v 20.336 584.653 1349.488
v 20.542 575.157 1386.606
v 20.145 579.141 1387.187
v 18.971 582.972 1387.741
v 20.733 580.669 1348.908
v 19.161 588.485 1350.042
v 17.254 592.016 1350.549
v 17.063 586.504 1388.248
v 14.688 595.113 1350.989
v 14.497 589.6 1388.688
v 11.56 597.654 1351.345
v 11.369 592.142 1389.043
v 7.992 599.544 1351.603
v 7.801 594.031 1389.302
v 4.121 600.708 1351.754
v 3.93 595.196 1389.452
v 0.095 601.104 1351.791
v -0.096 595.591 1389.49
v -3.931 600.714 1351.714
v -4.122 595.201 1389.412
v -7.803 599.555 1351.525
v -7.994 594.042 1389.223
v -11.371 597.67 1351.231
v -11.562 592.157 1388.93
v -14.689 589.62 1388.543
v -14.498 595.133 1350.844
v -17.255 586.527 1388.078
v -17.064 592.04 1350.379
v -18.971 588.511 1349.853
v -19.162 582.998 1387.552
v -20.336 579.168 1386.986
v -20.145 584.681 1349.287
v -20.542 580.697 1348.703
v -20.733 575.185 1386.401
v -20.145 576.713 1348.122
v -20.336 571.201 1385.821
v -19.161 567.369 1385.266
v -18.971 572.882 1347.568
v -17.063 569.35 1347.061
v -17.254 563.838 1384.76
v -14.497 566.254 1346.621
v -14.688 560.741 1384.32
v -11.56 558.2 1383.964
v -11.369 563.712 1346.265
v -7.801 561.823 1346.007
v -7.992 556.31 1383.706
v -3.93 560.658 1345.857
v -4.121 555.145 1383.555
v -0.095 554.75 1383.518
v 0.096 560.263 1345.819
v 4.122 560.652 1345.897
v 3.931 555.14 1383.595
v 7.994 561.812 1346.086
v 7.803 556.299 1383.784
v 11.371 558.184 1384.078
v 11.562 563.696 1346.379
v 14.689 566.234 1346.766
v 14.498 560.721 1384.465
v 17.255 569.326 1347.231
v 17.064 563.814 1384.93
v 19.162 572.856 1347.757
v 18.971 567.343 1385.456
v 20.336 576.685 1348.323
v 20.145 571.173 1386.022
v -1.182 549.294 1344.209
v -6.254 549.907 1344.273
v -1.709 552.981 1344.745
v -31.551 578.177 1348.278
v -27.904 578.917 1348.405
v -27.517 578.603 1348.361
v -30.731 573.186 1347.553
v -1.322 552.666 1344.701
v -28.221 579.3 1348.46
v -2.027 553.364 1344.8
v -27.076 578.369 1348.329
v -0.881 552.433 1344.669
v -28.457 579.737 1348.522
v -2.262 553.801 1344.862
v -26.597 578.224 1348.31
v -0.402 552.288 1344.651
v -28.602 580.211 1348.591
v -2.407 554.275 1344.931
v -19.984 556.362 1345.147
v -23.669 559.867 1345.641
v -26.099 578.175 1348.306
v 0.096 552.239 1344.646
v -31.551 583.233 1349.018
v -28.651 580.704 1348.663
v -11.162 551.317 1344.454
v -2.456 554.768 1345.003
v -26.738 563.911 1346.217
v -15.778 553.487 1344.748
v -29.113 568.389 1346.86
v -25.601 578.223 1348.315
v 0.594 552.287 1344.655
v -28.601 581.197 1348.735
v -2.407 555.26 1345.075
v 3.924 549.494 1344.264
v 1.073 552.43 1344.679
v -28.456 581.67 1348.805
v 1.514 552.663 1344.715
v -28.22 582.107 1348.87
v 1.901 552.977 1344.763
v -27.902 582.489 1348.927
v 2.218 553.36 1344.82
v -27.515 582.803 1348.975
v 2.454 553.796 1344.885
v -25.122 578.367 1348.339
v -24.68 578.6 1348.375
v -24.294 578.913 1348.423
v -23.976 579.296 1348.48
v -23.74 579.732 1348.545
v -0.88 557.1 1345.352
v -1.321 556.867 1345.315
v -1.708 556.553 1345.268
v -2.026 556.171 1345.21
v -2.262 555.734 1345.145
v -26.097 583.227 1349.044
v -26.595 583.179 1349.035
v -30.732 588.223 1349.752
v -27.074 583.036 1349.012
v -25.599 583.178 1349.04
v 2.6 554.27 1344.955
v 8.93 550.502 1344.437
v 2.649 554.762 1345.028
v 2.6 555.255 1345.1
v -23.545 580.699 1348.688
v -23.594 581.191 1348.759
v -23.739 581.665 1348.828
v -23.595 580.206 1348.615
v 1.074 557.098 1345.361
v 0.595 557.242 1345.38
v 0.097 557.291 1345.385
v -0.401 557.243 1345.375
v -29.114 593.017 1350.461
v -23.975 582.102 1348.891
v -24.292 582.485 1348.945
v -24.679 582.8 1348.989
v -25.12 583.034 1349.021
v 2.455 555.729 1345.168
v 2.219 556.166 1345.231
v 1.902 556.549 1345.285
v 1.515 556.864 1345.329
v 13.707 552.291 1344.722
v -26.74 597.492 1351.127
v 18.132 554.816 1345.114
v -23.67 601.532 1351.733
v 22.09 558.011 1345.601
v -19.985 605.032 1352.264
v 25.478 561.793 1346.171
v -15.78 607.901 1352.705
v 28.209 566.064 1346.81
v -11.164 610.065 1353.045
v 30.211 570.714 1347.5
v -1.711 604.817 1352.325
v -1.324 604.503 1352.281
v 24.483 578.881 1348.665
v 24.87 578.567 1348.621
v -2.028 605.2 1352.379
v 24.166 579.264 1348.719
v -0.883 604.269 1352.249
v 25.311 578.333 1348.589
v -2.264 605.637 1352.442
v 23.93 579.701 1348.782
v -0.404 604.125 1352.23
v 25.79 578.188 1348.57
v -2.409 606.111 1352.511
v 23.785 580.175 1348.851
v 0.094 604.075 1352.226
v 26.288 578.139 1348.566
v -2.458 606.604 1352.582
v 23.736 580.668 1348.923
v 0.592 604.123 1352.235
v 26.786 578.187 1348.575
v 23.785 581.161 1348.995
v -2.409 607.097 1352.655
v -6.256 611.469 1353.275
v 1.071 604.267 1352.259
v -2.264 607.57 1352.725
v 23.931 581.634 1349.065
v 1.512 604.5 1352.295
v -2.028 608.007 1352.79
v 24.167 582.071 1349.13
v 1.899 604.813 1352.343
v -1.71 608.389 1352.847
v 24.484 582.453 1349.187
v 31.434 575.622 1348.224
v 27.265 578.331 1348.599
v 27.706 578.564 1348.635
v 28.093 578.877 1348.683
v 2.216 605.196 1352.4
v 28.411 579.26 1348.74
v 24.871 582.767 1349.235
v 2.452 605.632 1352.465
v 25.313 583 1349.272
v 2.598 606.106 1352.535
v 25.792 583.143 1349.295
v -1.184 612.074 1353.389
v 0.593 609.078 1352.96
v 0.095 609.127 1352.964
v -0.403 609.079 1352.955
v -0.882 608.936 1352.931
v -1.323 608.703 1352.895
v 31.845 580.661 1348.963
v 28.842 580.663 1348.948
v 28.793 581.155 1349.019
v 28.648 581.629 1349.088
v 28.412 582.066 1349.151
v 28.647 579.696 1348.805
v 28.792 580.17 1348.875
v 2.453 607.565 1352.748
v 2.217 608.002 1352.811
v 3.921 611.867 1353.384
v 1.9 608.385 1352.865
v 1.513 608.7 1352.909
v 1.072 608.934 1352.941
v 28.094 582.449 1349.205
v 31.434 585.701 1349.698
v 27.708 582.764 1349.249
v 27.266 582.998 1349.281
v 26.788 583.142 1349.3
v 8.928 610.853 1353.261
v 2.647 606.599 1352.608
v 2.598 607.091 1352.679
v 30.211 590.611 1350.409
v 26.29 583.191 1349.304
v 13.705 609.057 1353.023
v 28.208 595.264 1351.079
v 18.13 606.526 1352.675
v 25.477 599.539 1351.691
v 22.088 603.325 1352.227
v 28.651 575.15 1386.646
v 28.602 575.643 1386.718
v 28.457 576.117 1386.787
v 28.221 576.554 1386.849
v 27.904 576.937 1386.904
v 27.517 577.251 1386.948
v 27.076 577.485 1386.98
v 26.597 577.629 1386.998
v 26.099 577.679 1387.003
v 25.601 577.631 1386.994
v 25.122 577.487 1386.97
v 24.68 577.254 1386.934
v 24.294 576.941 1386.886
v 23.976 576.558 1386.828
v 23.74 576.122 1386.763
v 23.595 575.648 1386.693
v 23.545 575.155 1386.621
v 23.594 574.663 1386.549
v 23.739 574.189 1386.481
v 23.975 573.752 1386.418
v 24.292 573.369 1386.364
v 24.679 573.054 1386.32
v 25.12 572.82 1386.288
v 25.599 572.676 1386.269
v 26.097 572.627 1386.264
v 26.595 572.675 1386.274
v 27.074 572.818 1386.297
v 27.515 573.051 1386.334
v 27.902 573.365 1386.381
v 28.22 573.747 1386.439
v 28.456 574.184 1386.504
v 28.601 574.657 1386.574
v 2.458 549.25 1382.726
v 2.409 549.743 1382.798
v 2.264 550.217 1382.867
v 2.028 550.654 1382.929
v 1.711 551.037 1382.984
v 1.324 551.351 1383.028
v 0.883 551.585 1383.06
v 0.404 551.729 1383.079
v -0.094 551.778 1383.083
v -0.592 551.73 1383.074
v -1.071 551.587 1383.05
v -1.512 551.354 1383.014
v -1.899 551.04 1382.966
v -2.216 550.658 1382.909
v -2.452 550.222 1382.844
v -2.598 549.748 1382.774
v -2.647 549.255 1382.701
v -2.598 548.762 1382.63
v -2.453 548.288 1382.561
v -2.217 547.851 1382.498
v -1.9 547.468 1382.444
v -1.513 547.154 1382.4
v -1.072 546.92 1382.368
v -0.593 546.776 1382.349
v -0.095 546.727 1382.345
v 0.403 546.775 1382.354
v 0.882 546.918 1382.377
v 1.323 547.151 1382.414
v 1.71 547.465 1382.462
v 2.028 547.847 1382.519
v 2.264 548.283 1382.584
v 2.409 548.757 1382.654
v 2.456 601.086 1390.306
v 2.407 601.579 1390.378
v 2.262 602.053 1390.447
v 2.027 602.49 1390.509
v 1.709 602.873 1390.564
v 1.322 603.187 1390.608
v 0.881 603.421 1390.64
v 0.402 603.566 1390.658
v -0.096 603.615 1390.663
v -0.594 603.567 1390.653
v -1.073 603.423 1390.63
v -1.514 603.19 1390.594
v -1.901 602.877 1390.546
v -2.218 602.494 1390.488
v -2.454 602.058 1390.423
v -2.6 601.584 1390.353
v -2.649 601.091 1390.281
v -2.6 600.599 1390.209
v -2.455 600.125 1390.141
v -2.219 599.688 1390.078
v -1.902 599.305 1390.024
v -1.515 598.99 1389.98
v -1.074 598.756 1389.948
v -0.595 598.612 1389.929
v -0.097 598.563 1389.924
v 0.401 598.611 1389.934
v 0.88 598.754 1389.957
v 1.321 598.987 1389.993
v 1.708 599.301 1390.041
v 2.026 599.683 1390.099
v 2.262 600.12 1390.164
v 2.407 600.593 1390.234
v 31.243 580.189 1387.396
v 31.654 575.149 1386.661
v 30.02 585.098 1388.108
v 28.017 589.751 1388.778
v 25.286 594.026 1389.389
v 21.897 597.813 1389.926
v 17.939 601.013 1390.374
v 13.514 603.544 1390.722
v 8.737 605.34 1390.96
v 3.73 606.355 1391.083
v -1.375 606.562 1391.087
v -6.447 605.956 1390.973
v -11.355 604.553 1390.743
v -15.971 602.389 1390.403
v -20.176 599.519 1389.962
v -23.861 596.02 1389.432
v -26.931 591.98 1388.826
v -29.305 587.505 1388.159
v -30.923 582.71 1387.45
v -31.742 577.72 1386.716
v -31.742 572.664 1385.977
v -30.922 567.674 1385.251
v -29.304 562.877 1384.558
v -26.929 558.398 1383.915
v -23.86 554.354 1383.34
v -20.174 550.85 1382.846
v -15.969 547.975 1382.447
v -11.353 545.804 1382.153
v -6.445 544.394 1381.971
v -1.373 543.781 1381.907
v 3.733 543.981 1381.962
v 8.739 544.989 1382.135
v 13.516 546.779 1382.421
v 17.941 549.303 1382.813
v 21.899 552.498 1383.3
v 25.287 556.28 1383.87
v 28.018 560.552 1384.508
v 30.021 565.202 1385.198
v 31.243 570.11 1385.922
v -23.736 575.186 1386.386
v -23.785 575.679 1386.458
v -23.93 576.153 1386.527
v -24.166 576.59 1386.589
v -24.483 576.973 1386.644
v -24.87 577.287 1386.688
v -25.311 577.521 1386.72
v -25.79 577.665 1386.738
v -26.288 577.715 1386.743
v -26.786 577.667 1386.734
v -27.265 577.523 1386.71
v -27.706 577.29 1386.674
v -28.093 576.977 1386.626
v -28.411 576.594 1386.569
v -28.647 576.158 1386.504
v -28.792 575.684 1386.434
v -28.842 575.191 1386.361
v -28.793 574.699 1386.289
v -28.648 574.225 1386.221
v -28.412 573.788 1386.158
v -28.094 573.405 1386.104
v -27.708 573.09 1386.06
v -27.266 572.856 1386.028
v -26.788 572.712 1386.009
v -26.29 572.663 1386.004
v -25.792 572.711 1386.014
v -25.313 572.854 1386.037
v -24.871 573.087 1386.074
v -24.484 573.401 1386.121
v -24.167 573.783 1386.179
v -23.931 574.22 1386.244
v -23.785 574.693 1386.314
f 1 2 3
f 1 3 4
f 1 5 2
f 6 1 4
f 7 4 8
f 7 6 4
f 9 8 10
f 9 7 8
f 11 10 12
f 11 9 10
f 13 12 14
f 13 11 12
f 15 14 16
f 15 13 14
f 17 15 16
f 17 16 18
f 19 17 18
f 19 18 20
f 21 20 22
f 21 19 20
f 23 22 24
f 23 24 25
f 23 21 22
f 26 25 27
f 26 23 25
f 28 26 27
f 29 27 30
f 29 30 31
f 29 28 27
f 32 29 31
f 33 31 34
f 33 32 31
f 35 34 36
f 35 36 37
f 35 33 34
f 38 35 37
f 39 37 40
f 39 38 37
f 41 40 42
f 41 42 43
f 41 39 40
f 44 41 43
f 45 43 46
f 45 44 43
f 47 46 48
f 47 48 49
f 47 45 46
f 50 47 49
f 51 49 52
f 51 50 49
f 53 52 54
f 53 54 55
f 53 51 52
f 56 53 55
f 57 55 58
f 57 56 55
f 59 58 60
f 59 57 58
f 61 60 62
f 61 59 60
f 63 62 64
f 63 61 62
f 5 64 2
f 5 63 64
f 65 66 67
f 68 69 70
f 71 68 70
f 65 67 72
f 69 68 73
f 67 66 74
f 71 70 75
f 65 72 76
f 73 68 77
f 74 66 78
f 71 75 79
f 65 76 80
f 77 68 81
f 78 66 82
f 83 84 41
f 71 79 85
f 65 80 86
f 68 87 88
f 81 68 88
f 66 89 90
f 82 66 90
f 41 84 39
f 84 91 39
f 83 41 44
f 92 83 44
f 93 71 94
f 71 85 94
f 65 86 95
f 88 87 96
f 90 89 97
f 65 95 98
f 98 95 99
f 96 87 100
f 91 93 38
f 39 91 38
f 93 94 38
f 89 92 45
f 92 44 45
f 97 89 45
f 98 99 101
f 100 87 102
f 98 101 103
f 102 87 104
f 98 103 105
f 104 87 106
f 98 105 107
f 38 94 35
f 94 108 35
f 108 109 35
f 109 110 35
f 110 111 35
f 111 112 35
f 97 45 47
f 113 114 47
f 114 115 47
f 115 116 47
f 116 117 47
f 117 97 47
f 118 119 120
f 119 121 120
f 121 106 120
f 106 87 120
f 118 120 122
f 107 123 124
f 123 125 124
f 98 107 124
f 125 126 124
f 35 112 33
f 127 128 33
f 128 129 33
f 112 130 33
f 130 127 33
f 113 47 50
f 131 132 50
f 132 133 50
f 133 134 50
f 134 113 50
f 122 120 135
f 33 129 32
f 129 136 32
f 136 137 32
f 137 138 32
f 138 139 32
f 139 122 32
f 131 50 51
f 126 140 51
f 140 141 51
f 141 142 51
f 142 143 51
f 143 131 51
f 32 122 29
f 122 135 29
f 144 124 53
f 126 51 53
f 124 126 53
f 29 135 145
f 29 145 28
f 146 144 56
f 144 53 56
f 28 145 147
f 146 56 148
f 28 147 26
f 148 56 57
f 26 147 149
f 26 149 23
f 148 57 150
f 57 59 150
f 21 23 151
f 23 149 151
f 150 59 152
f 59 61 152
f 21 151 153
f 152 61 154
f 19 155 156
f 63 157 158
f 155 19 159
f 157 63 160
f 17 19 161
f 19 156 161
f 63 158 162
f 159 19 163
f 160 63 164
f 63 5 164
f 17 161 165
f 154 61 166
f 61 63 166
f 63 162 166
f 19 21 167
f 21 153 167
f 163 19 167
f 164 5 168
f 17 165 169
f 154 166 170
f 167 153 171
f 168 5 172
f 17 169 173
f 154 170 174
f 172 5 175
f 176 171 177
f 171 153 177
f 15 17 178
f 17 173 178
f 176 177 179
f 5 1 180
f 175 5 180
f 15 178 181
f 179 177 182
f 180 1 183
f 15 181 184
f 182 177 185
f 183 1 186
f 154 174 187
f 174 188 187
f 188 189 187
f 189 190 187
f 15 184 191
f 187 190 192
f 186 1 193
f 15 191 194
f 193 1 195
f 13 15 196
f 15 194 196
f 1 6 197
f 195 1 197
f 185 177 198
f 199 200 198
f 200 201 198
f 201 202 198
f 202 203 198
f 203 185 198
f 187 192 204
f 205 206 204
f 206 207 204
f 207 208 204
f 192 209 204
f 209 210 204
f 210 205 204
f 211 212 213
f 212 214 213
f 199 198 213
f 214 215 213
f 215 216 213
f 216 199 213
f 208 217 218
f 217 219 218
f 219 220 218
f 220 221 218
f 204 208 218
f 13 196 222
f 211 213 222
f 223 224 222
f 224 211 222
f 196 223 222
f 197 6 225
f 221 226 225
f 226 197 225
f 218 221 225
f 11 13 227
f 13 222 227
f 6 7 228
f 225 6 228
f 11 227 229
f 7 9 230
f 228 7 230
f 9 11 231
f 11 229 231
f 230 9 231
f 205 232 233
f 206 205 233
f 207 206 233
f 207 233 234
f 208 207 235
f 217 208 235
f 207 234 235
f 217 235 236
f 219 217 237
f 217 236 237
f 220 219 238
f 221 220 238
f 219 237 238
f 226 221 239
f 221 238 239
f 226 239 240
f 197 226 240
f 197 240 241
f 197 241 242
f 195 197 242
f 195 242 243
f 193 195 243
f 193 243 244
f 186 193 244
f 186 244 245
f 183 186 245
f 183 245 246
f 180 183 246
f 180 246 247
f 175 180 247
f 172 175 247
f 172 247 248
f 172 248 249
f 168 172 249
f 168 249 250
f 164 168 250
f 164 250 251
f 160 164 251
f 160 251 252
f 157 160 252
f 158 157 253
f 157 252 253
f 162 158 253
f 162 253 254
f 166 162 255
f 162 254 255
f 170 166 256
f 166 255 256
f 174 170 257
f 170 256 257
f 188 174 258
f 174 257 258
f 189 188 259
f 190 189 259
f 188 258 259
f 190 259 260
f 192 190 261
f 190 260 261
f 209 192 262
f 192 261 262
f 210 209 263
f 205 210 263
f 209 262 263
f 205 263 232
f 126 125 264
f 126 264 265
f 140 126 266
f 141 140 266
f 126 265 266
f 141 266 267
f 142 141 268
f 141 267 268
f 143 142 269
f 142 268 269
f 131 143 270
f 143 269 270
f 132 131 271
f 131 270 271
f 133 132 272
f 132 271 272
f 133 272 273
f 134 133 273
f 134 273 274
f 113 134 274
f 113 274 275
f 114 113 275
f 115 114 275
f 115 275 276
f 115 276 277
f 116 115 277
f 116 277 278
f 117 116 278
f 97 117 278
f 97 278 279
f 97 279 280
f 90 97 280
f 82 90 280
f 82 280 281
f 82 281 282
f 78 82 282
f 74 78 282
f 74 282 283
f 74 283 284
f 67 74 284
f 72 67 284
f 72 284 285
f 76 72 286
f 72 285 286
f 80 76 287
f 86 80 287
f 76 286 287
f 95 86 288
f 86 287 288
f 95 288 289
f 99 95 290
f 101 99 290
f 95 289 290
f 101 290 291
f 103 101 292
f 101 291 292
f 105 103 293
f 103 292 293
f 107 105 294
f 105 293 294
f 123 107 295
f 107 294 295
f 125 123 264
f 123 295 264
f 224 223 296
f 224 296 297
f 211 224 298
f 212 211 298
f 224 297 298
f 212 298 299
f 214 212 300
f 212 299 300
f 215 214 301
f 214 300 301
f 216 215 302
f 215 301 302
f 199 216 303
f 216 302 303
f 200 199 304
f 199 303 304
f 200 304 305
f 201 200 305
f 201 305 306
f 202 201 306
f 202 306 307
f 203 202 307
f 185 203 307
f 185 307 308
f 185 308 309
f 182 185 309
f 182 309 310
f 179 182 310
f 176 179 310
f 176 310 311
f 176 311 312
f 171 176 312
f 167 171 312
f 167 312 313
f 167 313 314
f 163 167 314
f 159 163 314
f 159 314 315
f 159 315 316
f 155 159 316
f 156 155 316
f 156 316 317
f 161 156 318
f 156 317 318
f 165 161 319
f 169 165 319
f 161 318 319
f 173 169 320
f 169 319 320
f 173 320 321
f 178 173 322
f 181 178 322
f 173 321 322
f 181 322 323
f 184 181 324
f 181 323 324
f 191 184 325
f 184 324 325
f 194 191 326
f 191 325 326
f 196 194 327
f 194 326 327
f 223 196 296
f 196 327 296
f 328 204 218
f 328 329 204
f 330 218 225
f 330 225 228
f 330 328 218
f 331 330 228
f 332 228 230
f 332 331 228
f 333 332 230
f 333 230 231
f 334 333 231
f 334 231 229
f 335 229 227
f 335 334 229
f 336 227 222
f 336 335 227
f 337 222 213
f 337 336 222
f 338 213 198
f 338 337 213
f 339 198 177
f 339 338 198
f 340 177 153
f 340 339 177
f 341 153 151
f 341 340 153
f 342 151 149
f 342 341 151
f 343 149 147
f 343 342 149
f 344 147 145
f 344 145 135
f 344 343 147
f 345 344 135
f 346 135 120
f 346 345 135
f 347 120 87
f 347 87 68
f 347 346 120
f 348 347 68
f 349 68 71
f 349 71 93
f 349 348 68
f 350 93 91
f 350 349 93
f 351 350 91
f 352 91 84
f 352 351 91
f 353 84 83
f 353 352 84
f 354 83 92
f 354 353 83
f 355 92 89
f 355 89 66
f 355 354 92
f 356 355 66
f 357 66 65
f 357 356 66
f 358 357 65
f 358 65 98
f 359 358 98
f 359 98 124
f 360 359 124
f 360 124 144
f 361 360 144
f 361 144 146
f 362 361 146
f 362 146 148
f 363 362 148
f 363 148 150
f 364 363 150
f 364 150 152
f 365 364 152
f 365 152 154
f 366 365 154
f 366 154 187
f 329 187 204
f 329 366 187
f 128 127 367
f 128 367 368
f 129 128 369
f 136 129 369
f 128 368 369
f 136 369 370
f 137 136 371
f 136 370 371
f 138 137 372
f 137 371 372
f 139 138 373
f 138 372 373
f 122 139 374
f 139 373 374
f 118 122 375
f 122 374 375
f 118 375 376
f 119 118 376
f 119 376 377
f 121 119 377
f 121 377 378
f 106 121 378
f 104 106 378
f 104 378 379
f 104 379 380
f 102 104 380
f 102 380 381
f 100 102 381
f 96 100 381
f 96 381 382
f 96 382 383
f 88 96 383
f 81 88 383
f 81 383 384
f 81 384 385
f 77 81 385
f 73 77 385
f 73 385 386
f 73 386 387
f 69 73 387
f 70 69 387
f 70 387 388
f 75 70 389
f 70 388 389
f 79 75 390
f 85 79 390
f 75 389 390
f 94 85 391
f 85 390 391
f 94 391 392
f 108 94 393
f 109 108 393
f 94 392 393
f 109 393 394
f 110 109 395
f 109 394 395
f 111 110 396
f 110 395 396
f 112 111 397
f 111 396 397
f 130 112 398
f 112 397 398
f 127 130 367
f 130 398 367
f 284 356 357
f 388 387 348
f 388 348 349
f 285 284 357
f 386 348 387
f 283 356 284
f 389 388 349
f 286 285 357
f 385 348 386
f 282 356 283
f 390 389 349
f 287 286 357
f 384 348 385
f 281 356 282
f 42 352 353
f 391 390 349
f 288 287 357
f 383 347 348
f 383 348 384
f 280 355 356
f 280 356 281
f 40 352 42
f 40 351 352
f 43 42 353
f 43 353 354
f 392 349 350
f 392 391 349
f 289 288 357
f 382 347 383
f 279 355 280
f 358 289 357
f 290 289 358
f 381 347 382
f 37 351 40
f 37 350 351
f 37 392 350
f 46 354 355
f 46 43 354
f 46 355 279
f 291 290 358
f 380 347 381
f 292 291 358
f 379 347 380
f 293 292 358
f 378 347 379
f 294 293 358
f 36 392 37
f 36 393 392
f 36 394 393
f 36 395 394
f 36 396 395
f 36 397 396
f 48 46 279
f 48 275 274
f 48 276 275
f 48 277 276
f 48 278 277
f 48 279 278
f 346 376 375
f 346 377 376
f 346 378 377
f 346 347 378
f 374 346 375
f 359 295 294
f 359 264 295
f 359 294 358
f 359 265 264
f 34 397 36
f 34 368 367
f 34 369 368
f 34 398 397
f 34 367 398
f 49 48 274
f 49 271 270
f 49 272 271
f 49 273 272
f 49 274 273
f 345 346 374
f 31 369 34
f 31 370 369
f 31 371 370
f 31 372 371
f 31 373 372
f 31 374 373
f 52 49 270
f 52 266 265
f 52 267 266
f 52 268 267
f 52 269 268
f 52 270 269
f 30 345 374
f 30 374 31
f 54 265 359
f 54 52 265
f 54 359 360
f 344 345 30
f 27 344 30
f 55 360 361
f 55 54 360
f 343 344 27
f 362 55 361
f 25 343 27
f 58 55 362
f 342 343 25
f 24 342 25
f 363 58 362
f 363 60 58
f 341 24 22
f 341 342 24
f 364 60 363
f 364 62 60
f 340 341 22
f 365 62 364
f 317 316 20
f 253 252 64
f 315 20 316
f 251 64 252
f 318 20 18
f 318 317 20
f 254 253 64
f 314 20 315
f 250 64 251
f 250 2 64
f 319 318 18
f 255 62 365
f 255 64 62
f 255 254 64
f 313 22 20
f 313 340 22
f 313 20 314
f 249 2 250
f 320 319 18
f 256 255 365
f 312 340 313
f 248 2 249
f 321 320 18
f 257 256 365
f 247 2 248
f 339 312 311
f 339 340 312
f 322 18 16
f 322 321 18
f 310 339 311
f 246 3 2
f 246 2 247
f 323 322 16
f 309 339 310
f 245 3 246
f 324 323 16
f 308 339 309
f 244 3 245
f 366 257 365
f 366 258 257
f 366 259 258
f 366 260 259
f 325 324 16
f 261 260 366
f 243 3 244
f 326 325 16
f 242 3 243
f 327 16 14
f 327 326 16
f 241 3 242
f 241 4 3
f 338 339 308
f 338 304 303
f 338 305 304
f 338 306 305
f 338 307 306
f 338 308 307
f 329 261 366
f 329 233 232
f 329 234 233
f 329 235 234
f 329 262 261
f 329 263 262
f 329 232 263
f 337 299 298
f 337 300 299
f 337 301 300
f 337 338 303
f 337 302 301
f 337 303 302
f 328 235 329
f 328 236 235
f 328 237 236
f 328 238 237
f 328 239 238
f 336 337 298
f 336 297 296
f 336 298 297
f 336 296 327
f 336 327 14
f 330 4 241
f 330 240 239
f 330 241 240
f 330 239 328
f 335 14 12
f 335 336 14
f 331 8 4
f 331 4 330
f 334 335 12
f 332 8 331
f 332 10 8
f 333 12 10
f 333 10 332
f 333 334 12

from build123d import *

# Parameters (mm, degrees)
SKETCH1_R                   = 31.75
SKETCH1_R_2                 = 20.6375
BOSS_EXTRUDE1_DEPTH         = 19.05
F_1_4_20_TAPPED_HOLE1_D     = 5.1054
F_1_4_20_TAPPED_HOLE1_DEPTH = 38.1


with BuildPart() as part:
    # Sketch1 → Boss-Extrude1 (new body, symmetric)
    with BuildSketch(Plane(origin=(0, 577.92693102, 1367.654430732), x_dir=(0.999987453, -0.000687148, 0.004962002), z_dir=(-0.005009211, -0.144685018, 0.989465084))):
        Circle(SKETCH1_R)
        Circle(SKETCH1_R_2, mode=Mode.SUBTRACT)
    extrude(amount=BOSS_EXTRUDE1_DEPTH, both=True)

    # 1/4-20 Tapped Hole1
    with Locations(Plane(origin=(-6.264413672, -180.940036548, 1237.404194636), x_dir=(-0.999987401, 0.001044934, -0.004909685), z_dir=(0.005009211, 0.144685018, -0.989465084))):
        with Locations((-32.304604681, 769.73877208), (-6.101384965, 795.923048939), (20.082891894, 769.719829223), (-6.120327822, 743.535552364)):
            Hole(F_1_4_20_TAPPED_HOLE1_D / 2, depth=F_1_4_20_TAPPED_HOLE1_DEPTH)


solid = part.part
